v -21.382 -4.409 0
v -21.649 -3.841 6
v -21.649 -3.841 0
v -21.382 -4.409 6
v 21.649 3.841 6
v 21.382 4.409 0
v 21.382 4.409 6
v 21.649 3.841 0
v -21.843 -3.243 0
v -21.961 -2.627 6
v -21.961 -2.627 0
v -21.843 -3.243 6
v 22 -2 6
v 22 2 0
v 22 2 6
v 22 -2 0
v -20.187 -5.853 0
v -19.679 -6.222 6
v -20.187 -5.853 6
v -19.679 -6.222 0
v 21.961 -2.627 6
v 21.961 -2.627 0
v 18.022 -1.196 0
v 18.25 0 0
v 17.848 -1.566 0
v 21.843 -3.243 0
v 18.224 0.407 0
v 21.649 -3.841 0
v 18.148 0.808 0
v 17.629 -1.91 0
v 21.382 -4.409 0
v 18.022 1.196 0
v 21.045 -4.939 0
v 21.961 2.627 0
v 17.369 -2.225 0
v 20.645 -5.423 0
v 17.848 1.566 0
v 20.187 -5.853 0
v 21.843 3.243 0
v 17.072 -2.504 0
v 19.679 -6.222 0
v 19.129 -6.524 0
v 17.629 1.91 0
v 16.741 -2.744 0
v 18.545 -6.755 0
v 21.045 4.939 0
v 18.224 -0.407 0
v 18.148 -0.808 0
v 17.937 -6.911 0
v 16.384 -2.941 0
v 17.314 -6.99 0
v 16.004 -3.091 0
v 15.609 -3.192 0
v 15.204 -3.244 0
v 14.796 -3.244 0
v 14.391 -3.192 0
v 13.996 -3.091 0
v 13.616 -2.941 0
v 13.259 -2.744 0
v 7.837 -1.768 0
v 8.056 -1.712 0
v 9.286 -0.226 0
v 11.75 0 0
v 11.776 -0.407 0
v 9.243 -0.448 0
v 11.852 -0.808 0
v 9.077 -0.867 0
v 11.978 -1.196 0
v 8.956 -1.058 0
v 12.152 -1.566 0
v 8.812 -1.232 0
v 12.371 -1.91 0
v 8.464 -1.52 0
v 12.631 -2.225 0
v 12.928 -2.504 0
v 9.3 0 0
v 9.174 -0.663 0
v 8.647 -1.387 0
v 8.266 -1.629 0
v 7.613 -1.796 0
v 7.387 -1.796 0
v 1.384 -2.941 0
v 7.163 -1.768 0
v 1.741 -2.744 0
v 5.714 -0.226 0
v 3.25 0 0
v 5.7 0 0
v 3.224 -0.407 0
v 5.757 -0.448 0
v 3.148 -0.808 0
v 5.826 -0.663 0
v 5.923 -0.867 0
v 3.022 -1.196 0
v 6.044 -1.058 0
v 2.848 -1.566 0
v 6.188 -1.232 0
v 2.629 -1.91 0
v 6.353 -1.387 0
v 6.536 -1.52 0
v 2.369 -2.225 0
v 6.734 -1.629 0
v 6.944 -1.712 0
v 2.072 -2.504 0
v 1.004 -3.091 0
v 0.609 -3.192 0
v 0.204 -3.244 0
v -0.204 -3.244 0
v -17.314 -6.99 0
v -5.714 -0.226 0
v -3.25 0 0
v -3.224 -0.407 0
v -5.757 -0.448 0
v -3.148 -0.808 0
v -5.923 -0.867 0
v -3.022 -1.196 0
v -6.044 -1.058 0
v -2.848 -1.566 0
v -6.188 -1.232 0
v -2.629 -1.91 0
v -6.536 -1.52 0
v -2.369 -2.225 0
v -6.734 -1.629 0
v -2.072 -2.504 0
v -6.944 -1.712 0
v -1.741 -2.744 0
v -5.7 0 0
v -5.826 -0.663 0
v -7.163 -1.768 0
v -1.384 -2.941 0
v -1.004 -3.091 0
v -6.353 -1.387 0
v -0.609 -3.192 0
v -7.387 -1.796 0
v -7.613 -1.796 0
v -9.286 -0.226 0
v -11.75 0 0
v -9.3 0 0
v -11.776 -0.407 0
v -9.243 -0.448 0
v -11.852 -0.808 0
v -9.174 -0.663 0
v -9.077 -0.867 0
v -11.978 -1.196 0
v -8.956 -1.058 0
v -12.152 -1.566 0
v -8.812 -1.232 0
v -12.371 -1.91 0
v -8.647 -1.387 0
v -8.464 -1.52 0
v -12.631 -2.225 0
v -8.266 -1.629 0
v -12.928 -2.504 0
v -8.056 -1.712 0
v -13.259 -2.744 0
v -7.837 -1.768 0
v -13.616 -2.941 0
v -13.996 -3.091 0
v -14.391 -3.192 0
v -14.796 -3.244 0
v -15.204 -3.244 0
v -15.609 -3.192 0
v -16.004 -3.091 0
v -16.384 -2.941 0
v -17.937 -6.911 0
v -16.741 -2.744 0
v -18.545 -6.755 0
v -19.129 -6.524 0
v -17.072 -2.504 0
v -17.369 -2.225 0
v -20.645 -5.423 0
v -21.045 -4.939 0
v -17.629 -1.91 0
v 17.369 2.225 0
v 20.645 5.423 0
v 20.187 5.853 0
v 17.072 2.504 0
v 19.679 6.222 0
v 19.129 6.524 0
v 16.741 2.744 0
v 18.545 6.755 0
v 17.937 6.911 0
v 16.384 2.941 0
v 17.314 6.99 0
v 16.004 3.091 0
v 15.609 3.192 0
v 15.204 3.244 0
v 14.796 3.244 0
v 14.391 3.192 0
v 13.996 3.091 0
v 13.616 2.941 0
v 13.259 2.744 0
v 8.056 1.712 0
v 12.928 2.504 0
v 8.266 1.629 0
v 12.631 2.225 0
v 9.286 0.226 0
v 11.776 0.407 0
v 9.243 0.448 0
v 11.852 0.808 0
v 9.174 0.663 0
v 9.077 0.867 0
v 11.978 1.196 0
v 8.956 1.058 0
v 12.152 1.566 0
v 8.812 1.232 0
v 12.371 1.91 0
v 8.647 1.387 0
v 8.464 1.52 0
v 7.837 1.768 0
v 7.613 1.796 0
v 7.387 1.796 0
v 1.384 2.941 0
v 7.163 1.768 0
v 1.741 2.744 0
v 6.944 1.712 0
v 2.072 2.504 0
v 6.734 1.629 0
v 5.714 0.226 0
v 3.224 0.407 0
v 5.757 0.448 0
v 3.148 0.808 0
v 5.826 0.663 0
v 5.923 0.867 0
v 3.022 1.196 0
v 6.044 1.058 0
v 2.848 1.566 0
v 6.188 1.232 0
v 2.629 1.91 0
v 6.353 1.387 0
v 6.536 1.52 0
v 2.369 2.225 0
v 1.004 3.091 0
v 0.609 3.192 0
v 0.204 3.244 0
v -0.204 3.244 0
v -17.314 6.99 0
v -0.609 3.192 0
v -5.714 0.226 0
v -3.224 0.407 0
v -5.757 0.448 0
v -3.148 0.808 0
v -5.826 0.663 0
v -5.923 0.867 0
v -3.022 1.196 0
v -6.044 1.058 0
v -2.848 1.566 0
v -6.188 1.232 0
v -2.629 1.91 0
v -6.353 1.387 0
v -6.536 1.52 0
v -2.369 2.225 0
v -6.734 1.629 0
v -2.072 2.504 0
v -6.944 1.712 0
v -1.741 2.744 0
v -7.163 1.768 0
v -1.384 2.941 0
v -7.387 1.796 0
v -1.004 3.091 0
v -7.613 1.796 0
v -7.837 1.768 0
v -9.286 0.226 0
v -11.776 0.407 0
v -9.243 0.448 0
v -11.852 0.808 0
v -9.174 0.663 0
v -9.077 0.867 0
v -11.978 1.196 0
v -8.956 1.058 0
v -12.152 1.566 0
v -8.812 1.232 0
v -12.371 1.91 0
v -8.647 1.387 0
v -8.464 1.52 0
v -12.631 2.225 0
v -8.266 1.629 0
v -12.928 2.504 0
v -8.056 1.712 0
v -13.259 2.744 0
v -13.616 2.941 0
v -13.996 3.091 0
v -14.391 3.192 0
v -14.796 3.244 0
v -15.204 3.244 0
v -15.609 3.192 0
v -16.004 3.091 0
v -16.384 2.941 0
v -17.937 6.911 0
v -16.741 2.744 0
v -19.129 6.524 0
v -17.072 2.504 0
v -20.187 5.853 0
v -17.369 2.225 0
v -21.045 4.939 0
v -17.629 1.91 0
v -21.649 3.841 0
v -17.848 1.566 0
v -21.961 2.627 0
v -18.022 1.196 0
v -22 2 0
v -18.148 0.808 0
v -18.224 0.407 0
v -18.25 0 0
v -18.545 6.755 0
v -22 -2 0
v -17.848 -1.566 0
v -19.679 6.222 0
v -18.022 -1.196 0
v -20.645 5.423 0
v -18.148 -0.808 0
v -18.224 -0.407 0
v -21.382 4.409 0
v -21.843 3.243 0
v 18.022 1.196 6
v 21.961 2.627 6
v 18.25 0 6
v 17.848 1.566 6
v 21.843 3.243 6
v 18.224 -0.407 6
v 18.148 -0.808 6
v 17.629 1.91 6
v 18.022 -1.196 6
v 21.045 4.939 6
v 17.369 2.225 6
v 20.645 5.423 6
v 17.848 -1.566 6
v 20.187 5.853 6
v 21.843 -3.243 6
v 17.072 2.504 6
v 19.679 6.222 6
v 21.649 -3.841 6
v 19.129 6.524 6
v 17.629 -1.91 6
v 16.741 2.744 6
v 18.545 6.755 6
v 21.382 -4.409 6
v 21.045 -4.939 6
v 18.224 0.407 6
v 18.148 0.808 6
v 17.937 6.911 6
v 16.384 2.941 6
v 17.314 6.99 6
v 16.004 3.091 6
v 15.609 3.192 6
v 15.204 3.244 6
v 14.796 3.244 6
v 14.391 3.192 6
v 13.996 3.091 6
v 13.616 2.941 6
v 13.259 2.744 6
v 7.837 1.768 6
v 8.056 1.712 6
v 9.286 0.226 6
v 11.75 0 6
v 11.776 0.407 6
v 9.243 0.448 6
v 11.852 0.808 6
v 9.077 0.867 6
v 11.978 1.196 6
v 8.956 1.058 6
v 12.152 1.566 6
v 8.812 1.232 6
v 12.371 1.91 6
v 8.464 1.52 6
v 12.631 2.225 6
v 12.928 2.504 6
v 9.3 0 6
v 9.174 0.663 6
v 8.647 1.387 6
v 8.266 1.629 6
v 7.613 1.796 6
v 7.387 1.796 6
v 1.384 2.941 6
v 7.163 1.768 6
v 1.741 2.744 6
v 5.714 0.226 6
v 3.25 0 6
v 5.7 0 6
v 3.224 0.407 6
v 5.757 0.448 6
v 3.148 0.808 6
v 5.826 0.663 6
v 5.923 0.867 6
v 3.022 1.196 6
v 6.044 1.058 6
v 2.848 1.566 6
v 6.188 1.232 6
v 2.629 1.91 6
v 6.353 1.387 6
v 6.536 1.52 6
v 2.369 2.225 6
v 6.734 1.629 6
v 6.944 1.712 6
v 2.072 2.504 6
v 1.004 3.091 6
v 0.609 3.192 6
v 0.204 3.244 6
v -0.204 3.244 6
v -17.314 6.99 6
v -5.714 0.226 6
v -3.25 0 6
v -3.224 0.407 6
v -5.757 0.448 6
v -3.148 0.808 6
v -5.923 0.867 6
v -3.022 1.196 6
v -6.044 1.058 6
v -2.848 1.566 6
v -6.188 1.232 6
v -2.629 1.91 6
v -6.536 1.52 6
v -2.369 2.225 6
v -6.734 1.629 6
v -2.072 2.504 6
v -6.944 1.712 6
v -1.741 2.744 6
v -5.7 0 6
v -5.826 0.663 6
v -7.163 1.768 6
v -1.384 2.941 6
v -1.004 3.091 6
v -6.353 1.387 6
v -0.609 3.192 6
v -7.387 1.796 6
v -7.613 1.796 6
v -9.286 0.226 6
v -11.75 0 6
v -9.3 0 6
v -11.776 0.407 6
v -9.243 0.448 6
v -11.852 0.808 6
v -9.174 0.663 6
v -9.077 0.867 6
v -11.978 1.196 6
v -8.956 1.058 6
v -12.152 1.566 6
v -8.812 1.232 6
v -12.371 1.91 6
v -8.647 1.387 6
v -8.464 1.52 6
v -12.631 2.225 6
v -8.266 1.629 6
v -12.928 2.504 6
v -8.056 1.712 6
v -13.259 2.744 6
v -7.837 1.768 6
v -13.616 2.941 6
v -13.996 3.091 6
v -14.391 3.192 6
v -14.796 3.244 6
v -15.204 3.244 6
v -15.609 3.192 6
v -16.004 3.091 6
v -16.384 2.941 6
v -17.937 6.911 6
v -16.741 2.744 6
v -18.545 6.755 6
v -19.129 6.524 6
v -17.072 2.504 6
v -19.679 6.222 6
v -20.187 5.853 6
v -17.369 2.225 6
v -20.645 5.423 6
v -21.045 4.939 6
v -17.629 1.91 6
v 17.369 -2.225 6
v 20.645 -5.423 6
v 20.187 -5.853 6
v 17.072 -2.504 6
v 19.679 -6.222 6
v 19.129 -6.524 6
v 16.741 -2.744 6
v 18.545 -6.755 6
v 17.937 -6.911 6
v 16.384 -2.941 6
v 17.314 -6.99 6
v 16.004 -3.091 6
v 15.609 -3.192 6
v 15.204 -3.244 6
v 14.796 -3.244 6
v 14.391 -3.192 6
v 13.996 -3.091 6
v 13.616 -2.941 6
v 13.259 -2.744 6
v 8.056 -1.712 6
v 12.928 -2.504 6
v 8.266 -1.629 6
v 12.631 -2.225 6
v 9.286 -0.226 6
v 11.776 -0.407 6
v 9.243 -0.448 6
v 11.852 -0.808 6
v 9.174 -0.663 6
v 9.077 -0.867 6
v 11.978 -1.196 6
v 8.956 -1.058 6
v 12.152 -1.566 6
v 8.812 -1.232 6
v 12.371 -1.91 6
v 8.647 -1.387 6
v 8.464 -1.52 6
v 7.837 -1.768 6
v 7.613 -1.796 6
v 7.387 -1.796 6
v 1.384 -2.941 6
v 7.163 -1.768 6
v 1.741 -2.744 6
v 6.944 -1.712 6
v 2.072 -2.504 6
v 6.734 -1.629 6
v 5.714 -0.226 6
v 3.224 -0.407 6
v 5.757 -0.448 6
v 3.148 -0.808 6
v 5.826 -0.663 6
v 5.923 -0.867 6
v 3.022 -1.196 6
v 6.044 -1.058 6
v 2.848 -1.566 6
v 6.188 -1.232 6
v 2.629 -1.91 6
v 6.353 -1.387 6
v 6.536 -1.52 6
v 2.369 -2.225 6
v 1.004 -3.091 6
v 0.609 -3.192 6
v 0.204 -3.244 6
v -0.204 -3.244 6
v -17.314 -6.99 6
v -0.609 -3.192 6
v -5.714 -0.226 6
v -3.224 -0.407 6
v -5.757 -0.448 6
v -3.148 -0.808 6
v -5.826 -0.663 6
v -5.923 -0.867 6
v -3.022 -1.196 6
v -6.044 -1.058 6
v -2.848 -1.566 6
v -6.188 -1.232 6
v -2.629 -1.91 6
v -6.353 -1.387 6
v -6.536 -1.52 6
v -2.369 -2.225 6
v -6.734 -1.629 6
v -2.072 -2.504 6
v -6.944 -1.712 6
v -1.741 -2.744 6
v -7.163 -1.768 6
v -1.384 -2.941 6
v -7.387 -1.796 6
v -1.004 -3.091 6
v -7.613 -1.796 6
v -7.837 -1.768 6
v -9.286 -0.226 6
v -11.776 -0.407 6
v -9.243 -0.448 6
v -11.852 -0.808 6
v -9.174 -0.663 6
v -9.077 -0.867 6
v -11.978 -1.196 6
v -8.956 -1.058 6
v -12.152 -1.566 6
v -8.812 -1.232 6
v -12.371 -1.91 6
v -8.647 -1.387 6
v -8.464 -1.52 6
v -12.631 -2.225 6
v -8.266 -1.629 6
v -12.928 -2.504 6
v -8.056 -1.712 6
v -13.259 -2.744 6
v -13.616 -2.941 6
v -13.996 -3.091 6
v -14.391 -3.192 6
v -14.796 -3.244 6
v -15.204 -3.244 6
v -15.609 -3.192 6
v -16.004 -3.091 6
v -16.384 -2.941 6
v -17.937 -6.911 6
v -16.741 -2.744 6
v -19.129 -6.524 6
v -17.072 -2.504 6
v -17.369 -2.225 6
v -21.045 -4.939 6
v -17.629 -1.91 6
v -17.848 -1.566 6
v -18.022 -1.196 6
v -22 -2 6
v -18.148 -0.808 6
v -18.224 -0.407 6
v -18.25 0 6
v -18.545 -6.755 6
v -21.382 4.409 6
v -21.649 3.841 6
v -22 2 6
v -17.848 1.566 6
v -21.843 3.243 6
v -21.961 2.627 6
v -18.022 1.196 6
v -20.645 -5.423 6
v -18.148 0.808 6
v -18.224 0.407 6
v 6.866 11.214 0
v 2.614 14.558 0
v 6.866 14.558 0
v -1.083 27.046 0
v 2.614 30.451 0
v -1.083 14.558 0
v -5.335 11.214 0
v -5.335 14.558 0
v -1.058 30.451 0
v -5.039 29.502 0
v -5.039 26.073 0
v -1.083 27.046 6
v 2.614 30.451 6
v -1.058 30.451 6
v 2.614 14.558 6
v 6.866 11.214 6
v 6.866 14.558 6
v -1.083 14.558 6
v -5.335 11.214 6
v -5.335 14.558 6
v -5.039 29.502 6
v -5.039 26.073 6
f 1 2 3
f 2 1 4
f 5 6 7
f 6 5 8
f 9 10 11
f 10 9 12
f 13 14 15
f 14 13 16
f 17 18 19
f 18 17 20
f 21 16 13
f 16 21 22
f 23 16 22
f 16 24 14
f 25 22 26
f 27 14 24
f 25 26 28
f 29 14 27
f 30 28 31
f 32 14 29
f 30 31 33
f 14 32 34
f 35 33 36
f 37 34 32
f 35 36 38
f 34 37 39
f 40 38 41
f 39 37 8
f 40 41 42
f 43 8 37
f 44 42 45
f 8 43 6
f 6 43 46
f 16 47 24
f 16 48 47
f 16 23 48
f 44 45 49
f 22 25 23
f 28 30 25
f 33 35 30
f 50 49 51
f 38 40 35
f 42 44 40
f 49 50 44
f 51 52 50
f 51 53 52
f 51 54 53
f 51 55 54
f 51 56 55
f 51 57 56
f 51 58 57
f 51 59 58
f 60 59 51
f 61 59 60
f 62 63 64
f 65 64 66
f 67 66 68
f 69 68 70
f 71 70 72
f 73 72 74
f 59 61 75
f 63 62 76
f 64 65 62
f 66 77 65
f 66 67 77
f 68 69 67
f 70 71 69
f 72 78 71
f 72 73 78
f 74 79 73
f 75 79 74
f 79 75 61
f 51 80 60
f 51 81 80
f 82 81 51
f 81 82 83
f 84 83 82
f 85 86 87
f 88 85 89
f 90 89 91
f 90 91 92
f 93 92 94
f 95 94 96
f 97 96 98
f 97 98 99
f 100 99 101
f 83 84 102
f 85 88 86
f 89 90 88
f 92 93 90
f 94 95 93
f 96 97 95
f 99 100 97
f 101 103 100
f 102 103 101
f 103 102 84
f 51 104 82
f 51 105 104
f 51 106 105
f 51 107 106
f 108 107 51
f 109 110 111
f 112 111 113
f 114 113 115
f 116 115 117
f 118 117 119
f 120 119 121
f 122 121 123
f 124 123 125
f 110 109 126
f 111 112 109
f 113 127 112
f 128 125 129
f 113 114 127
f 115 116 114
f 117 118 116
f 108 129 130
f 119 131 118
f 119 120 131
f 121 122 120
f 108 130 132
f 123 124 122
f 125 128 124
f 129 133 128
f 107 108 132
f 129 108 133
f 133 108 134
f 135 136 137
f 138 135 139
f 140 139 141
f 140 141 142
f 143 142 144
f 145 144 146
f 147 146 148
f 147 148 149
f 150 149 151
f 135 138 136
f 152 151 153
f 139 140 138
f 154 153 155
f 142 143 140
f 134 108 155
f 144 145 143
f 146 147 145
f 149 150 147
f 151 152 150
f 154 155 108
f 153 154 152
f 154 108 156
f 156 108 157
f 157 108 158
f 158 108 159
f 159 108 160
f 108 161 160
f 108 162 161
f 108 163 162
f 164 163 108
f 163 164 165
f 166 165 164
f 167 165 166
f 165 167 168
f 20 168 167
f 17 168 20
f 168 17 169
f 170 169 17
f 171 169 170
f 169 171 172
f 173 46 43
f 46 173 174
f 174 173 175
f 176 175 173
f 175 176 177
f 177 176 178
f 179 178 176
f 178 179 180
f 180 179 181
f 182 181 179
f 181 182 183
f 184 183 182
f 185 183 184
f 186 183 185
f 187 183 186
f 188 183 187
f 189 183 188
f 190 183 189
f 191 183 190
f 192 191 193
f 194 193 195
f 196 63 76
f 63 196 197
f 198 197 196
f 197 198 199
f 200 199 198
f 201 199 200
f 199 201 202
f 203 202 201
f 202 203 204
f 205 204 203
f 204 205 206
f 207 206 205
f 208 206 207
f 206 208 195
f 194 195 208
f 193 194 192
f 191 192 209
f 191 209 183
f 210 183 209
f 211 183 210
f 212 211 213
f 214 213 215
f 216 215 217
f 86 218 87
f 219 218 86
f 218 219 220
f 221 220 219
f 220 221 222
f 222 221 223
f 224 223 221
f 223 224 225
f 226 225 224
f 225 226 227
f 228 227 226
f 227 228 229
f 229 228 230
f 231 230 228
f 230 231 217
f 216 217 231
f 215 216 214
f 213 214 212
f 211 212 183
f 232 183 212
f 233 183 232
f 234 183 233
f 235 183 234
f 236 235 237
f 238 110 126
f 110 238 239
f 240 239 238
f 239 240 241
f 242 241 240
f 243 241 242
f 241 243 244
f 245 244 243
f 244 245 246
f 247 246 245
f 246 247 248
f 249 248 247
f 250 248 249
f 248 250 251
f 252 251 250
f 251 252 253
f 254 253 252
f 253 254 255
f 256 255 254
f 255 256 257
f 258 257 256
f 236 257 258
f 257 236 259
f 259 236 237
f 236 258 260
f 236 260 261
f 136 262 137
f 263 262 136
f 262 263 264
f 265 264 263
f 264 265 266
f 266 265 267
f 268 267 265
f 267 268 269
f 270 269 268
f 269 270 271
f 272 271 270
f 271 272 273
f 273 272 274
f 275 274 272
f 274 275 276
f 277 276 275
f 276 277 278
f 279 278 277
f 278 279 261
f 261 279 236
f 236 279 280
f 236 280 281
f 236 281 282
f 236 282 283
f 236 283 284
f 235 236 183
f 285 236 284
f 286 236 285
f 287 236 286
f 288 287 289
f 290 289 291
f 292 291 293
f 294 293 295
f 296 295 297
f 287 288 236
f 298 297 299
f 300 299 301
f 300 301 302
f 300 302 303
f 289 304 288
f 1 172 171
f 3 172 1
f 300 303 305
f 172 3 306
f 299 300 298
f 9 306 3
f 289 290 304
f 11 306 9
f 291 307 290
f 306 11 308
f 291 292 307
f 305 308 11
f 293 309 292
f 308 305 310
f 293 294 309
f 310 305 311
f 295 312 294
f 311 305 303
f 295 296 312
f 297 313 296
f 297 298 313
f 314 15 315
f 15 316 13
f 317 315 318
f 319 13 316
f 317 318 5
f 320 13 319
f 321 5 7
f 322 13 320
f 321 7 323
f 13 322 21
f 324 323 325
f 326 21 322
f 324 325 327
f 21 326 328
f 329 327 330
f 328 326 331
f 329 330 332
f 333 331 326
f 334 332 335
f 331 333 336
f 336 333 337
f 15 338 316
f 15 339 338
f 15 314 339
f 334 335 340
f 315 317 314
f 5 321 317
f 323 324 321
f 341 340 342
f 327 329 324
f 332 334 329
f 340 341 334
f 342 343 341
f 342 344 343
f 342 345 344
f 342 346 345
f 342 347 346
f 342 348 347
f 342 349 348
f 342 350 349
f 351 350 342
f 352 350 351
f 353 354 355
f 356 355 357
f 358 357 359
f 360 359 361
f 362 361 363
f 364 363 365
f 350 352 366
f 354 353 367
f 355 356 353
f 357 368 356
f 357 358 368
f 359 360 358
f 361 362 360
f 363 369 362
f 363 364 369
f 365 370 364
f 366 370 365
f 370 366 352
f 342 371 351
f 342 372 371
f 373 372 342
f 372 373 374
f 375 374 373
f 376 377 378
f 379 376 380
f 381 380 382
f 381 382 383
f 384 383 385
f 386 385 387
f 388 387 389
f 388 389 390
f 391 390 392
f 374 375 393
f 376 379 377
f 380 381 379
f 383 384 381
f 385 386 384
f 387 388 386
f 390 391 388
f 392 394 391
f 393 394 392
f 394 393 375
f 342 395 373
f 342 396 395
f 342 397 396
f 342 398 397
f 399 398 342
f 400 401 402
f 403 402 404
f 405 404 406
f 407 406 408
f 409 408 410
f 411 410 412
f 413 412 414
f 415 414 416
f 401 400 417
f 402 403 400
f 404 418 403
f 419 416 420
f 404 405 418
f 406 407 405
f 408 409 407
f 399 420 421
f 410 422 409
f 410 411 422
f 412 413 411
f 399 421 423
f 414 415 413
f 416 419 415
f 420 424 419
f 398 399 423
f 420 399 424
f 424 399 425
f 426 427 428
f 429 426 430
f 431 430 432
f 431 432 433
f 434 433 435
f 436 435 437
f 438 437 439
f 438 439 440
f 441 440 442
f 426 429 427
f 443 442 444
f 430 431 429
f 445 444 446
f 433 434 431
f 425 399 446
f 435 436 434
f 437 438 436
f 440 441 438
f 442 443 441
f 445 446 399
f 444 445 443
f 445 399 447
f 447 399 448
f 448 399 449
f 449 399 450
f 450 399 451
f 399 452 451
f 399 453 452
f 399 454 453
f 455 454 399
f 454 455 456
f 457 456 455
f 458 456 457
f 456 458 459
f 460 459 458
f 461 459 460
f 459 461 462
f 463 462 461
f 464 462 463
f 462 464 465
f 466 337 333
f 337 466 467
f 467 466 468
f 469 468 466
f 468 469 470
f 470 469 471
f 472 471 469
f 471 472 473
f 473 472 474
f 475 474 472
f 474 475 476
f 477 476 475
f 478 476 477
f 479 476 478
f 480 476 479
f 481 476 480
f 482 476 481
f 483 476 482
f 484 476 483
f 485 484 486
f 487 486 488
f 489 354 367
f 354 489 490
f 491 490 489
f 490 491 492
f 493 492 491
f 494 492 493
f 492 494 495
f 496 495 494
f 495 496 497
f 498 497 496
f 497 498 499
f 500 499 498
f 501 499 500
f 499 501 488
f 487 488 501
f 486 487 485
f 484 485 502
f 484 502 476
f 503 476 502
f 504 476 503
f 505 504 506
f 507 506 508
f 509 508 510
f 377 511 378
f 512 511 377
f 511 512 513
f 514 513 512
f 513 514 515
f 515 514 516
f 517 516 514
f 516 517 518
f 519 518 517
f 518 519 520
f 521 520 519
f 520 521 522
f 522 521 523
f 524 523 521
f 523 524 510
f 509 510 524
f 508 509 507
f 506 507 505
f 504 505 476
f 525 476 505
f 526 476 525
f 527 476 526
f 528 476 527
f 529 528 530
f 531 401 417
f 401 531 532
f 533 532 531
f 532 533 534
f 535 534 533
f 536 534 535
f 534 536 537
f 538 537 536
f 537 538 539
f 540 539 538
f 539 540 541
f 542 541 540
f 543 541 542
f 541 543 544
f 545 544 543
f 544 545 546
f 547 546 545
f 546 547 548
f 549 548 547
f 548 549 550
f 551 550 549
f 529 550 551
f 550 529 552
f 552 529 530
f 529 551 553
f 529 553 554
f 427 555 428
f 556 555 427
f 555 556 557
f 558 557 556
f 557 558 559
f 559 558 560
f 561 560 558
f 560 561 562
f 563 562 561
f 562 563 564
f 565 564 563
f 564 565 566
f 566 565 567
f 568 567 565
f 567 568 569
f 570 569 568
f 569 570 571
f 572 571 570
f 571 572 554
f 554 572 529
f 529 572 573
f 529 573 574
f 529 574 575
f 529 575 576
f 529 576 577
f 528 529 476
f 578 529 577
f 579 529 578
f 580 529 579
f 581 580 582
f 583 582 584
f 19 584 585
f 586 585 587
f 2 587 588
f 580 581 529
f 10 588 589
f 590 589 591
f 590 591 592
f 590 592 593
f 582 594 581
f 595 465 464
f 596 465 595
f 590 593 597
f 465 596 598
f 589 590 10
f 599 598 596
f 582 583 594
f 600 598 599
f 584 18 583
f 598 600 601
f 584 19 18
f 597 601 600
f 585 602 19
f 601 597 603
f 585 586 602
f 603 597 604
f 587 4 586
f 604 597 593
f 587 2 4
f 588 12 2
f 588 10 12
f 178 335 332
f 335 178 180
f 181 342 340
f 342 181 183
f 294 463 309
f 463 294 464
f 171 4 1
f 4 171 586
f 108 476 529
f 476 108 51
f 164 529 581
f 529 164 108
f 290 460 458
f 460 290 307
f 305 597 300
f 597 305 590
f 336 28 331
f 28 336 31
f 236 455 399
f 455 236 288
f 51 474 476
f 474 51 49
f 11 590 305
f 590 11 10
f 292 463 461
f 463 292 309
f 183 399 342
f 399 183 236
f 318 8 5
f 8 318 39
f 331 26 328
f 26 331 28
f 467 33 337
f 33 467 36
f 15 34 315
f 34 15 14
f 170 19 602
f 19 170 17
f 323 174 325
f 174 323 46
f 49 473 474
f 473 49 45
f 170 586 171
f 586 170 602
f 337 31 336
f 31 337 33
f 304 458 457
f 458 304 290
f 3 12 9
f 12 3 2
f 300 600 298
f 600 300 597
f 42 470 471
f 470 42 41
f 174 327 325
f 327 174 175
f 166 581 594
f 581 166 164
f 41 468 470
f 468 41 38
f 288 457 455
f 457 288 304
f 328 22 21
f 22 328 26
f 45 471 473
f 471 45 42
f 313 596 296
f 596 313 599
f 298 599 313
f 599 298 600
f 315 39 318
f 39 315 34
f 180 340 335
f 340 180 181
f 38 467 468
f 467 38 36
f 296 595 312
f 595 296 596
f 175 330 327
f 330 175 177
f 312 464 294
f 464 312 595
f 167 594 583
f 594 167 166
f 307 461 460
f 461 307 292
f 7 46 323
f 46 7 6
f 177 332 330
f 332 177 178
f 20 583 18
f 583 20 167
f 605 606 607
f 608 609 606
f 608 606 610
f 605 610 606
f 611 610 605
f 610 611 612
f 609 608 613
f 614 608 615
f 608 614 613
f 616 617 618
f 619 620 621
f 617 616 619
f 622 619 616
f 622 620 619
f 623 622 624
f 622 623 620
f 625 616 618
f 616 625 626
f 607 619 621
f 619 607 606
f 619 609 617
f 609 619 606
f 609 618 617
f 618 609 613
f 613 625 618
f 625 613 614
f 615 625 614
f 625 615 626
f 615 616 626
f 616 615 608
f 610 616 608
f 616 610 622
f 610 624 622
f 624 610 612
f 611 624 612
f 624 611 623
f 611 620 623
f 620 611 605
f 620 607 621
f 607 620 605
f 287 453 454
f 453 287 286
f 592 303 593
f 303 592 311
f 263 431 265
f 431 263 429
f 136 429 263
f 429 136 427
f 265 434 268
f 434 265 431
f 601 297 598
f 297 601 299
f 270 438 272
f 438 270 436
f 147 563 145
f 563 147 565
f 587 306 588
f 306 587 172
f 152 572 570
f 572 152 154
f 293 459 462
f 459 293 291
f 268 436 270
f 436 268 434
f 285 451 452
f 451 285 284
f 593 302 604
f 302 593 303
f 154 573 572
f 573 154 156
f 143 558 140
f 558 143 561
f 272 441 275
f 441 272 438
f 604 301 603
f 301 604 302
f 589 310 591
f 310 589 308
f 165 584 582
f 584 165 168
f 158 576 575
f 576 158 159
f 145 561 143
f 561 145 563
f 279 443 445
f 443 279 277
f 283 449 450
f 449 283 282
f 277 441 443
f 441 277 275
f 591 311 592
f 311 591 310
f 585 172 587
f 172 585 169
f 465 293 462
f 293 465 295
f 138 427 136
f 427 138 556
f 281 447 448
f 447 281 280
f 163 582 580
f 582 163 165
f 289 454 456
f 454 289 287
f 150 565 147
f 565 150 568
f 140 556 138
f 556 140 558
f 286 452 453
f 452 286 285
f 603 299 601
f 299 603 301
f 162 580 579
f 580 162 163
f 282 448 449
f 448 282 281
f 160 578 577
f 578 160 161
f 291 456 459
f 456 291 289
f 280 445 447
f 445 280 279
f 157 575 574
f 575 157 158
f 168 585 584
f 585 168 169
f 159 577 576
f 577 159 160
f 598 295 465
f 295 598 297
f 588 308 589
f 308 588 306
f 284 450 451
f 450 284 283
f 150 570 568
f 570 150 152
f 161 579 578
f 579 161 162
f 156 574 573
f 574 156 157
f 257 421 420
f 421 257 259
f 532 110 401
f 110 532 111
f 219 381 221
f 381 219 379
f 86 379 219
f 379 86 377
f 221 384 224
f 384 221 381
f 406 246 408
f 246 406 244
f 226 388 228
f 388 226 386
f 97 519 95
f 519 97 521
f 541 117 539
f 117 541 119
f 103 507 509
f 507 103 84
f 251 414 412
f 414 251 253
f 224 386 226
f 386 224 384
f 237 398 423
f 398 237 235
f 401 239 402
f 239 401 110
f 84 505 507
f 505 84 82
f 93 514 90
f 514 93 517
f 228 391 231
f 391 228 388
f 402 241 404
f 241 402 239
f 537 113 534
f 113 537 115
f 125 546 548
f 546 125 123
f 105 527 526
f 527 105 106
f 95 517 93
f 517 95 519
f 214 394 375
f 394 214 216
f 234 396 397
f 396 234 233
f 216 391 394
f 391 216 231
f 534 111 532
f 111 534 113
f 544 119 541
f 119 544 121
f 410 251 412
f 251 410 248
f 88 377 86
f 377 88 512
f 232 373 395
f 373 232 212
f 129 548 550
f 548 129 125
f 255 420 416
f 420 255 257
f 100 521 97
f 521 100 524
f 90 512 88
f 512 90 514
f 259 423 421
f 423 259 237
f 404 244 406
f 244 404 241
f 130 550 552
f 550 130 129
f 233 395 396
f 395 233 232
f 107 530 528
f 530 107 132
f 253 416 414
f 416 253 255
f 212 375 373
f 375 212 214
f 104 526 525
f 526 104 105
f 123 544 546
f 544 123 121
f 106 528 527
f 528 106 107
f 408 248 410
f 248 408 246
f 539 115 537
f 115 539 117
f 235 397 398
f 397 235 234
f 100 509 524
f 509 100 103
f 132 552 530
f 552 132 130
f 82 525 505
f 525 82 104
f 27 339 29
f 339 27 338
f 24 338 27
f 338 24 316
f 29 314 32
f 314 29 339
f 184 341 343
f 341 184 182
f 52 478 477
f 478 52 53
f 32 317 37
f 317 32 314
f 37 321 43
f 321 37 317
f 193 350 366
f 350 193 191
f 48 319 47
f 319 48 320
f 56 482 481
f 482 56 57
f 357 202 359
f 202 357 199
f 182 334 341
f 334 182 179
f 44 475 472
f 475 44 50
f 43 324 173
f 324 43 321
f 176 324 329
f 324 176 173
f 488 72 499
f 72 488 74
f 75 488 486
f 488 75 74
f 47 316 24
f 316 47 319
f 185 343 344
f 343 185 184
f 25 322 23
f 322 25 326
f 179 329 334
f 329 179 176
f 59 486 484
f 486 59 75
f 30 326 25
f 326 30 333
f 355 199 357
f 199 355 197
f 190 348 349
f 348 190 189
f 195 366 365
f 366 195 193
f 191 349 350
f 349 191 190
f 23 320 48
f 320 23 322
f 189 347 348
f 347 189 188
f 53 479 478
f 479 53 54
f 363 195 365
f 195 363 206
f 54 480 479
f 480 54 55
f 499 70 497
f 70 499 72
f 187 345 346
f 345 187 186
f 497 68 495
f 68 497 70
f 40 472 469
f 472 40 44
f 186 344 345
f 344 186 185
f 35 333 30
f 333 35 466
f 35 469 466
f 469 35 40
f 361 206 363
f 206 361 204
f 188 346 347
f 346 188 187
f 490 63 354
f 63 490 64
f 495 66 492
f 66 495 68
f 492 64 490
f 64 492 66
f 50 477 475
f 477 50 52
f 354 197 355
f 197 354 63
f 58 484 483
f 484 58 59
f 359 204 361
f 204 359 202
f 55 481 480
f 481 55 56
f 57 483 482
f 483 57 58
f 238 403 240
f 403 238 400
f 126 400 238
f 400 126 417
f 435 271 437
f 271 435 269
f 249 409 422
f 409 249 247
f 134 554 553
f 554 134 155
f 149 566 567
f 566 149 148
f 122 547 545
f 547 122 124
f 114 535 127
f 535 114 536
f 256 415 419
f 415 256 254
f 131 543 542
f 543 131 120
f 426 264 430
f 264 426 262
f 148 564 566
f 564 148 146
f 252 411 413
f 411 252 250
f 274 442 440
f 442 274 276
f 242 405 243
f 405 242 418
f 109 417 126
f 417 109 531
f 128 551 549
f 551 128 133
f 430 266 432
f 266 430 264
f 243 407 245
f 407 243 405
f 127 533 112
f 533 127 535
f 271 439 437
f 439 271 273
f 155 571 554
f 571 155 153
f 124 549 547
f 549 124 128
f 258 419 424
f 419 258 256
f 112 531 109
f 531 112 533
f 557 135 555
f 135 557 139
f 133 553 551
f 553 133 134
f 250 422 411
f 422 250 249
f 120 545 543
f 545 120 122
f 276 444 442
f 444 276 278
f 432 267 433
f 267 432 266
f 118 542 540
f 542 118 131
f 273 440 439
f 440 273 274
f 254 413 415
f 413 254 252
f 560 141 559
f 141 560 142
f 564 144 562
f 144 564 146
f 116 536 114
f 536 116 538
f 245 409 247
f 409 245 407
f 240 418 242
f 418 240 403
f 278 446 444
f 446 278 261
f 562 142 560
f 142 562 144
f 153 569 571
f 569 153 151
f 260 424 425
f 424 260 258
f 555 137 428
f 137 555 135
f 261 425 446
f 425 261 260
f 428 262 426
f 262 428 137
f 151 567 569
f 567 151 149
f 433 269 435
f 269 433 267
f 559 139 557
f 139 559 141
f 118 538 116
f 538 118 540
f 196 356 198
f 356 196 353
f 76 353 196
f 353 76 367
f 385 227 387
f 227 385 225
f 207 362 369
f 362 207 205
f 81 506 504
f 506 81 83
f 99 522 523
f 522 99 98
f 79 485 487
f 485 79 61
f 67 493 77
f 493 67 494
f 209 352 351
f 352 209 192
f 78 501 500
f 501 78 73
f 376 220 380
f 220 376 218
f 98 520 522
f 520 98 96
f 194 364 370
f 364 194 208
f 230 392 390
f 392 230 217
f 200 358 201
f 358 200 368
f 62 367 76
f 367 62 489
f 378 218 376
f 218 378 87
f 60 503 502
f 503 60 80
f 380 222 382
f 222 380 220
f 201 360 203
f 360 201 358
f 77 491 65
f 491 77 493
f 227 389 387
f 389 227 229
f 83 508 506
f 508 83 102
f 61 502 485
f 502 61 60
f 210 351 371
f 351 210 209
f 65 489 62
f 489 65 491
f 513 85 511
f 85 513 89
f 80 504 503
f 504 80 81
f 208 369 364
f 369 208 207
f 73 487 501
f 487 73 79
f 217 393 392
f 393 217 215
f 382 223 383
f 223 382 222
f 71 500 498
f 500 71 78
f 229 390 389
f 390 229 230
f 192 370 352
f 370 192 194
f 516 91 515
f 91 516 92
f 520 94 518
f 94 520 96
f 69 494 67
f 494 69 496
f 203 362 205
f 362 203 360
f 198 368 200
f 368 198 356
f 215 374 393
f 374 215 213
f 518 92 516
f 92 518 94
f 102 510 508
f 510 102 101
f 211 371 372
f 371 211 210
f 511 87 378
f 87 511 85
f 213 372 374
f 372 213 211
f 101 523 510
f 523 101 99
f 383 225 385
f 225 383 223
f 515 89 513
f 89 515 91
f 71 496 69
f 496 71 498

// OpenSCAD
$fn = 50;


difference() {
	union() {
		hull() {
			translate(v = [-17.0000000000, 2.0000000000, 0]) {
				cylinder(h = 6, r = 5);
			}
			translate(v = [17.0000000000, 2.0000000000, 0]) {
				cylinder(h = 6, r = 5);
			}
			translate(v = [-17.0000000000, -2.0000000000, 0]) {
				cylinder(h = 6, r = 5);
			}
			translate(v = [17.0000000000, -2.0000000000, 0]) {
				cylinder(h = 6, r = 5);
			}
		}
		translate(v = [0, 30.0000000000, 0]) {
			linear_extrude(height = 6) {
				text(font = "DejaVu Sans Mono:style=Bold", halign = "center", size = 19.0000000000, text = "1", valign = "top");
			}
		}
	}
	union() {
		translate(v = [-15.0000000000, 0.0000000000, 0]) {
			translate(v = [0, 0, -100]) {
				cylinder(h = 200, r = 3.2500000000);
			}
		}
		translate(v = [0, 0, -100]) {
			cylinder(h = 200, r = 3.2500000000);
		}
		translate(v = [15.0000000000, 0.0000000000, 0]) {
			translate(v = [0, 0, -100]) {
				cylinder(h = 200, r = 3.2500000000);
			}
		}
		translate(v = [-15.0000000000, 0.0000000000, 0]) {
			translate(v = [0, 0, -100]) {
				cylinder(h = 200, r = 1.8000000000);
			}
		}
		translate(v = [-7.5000000000, 0.0000000000, 0]) {
			translate(v = [0, 0, -100]) {
				cylinder(h = 200, r = 1.8000000000);
			}
		}
		translate(v = [0, 0, -100]) {
			cylinder(h = 200, r = 1.8000000000);
		}
		translate(v = [7.5000000000, 0.0000000000, 0]) {
			translate(v = [0, 0, -100]) {
				cylinder(h = 200, r = 1.8000000000);
			}
		}
		translate(v = [15.0000000000, 0.0000000000, 0]) {
			translate(v = [0, 0, -100]) {
				cylinder(h = 200, r = 1.8000000000);
			}
		}
	}
}
